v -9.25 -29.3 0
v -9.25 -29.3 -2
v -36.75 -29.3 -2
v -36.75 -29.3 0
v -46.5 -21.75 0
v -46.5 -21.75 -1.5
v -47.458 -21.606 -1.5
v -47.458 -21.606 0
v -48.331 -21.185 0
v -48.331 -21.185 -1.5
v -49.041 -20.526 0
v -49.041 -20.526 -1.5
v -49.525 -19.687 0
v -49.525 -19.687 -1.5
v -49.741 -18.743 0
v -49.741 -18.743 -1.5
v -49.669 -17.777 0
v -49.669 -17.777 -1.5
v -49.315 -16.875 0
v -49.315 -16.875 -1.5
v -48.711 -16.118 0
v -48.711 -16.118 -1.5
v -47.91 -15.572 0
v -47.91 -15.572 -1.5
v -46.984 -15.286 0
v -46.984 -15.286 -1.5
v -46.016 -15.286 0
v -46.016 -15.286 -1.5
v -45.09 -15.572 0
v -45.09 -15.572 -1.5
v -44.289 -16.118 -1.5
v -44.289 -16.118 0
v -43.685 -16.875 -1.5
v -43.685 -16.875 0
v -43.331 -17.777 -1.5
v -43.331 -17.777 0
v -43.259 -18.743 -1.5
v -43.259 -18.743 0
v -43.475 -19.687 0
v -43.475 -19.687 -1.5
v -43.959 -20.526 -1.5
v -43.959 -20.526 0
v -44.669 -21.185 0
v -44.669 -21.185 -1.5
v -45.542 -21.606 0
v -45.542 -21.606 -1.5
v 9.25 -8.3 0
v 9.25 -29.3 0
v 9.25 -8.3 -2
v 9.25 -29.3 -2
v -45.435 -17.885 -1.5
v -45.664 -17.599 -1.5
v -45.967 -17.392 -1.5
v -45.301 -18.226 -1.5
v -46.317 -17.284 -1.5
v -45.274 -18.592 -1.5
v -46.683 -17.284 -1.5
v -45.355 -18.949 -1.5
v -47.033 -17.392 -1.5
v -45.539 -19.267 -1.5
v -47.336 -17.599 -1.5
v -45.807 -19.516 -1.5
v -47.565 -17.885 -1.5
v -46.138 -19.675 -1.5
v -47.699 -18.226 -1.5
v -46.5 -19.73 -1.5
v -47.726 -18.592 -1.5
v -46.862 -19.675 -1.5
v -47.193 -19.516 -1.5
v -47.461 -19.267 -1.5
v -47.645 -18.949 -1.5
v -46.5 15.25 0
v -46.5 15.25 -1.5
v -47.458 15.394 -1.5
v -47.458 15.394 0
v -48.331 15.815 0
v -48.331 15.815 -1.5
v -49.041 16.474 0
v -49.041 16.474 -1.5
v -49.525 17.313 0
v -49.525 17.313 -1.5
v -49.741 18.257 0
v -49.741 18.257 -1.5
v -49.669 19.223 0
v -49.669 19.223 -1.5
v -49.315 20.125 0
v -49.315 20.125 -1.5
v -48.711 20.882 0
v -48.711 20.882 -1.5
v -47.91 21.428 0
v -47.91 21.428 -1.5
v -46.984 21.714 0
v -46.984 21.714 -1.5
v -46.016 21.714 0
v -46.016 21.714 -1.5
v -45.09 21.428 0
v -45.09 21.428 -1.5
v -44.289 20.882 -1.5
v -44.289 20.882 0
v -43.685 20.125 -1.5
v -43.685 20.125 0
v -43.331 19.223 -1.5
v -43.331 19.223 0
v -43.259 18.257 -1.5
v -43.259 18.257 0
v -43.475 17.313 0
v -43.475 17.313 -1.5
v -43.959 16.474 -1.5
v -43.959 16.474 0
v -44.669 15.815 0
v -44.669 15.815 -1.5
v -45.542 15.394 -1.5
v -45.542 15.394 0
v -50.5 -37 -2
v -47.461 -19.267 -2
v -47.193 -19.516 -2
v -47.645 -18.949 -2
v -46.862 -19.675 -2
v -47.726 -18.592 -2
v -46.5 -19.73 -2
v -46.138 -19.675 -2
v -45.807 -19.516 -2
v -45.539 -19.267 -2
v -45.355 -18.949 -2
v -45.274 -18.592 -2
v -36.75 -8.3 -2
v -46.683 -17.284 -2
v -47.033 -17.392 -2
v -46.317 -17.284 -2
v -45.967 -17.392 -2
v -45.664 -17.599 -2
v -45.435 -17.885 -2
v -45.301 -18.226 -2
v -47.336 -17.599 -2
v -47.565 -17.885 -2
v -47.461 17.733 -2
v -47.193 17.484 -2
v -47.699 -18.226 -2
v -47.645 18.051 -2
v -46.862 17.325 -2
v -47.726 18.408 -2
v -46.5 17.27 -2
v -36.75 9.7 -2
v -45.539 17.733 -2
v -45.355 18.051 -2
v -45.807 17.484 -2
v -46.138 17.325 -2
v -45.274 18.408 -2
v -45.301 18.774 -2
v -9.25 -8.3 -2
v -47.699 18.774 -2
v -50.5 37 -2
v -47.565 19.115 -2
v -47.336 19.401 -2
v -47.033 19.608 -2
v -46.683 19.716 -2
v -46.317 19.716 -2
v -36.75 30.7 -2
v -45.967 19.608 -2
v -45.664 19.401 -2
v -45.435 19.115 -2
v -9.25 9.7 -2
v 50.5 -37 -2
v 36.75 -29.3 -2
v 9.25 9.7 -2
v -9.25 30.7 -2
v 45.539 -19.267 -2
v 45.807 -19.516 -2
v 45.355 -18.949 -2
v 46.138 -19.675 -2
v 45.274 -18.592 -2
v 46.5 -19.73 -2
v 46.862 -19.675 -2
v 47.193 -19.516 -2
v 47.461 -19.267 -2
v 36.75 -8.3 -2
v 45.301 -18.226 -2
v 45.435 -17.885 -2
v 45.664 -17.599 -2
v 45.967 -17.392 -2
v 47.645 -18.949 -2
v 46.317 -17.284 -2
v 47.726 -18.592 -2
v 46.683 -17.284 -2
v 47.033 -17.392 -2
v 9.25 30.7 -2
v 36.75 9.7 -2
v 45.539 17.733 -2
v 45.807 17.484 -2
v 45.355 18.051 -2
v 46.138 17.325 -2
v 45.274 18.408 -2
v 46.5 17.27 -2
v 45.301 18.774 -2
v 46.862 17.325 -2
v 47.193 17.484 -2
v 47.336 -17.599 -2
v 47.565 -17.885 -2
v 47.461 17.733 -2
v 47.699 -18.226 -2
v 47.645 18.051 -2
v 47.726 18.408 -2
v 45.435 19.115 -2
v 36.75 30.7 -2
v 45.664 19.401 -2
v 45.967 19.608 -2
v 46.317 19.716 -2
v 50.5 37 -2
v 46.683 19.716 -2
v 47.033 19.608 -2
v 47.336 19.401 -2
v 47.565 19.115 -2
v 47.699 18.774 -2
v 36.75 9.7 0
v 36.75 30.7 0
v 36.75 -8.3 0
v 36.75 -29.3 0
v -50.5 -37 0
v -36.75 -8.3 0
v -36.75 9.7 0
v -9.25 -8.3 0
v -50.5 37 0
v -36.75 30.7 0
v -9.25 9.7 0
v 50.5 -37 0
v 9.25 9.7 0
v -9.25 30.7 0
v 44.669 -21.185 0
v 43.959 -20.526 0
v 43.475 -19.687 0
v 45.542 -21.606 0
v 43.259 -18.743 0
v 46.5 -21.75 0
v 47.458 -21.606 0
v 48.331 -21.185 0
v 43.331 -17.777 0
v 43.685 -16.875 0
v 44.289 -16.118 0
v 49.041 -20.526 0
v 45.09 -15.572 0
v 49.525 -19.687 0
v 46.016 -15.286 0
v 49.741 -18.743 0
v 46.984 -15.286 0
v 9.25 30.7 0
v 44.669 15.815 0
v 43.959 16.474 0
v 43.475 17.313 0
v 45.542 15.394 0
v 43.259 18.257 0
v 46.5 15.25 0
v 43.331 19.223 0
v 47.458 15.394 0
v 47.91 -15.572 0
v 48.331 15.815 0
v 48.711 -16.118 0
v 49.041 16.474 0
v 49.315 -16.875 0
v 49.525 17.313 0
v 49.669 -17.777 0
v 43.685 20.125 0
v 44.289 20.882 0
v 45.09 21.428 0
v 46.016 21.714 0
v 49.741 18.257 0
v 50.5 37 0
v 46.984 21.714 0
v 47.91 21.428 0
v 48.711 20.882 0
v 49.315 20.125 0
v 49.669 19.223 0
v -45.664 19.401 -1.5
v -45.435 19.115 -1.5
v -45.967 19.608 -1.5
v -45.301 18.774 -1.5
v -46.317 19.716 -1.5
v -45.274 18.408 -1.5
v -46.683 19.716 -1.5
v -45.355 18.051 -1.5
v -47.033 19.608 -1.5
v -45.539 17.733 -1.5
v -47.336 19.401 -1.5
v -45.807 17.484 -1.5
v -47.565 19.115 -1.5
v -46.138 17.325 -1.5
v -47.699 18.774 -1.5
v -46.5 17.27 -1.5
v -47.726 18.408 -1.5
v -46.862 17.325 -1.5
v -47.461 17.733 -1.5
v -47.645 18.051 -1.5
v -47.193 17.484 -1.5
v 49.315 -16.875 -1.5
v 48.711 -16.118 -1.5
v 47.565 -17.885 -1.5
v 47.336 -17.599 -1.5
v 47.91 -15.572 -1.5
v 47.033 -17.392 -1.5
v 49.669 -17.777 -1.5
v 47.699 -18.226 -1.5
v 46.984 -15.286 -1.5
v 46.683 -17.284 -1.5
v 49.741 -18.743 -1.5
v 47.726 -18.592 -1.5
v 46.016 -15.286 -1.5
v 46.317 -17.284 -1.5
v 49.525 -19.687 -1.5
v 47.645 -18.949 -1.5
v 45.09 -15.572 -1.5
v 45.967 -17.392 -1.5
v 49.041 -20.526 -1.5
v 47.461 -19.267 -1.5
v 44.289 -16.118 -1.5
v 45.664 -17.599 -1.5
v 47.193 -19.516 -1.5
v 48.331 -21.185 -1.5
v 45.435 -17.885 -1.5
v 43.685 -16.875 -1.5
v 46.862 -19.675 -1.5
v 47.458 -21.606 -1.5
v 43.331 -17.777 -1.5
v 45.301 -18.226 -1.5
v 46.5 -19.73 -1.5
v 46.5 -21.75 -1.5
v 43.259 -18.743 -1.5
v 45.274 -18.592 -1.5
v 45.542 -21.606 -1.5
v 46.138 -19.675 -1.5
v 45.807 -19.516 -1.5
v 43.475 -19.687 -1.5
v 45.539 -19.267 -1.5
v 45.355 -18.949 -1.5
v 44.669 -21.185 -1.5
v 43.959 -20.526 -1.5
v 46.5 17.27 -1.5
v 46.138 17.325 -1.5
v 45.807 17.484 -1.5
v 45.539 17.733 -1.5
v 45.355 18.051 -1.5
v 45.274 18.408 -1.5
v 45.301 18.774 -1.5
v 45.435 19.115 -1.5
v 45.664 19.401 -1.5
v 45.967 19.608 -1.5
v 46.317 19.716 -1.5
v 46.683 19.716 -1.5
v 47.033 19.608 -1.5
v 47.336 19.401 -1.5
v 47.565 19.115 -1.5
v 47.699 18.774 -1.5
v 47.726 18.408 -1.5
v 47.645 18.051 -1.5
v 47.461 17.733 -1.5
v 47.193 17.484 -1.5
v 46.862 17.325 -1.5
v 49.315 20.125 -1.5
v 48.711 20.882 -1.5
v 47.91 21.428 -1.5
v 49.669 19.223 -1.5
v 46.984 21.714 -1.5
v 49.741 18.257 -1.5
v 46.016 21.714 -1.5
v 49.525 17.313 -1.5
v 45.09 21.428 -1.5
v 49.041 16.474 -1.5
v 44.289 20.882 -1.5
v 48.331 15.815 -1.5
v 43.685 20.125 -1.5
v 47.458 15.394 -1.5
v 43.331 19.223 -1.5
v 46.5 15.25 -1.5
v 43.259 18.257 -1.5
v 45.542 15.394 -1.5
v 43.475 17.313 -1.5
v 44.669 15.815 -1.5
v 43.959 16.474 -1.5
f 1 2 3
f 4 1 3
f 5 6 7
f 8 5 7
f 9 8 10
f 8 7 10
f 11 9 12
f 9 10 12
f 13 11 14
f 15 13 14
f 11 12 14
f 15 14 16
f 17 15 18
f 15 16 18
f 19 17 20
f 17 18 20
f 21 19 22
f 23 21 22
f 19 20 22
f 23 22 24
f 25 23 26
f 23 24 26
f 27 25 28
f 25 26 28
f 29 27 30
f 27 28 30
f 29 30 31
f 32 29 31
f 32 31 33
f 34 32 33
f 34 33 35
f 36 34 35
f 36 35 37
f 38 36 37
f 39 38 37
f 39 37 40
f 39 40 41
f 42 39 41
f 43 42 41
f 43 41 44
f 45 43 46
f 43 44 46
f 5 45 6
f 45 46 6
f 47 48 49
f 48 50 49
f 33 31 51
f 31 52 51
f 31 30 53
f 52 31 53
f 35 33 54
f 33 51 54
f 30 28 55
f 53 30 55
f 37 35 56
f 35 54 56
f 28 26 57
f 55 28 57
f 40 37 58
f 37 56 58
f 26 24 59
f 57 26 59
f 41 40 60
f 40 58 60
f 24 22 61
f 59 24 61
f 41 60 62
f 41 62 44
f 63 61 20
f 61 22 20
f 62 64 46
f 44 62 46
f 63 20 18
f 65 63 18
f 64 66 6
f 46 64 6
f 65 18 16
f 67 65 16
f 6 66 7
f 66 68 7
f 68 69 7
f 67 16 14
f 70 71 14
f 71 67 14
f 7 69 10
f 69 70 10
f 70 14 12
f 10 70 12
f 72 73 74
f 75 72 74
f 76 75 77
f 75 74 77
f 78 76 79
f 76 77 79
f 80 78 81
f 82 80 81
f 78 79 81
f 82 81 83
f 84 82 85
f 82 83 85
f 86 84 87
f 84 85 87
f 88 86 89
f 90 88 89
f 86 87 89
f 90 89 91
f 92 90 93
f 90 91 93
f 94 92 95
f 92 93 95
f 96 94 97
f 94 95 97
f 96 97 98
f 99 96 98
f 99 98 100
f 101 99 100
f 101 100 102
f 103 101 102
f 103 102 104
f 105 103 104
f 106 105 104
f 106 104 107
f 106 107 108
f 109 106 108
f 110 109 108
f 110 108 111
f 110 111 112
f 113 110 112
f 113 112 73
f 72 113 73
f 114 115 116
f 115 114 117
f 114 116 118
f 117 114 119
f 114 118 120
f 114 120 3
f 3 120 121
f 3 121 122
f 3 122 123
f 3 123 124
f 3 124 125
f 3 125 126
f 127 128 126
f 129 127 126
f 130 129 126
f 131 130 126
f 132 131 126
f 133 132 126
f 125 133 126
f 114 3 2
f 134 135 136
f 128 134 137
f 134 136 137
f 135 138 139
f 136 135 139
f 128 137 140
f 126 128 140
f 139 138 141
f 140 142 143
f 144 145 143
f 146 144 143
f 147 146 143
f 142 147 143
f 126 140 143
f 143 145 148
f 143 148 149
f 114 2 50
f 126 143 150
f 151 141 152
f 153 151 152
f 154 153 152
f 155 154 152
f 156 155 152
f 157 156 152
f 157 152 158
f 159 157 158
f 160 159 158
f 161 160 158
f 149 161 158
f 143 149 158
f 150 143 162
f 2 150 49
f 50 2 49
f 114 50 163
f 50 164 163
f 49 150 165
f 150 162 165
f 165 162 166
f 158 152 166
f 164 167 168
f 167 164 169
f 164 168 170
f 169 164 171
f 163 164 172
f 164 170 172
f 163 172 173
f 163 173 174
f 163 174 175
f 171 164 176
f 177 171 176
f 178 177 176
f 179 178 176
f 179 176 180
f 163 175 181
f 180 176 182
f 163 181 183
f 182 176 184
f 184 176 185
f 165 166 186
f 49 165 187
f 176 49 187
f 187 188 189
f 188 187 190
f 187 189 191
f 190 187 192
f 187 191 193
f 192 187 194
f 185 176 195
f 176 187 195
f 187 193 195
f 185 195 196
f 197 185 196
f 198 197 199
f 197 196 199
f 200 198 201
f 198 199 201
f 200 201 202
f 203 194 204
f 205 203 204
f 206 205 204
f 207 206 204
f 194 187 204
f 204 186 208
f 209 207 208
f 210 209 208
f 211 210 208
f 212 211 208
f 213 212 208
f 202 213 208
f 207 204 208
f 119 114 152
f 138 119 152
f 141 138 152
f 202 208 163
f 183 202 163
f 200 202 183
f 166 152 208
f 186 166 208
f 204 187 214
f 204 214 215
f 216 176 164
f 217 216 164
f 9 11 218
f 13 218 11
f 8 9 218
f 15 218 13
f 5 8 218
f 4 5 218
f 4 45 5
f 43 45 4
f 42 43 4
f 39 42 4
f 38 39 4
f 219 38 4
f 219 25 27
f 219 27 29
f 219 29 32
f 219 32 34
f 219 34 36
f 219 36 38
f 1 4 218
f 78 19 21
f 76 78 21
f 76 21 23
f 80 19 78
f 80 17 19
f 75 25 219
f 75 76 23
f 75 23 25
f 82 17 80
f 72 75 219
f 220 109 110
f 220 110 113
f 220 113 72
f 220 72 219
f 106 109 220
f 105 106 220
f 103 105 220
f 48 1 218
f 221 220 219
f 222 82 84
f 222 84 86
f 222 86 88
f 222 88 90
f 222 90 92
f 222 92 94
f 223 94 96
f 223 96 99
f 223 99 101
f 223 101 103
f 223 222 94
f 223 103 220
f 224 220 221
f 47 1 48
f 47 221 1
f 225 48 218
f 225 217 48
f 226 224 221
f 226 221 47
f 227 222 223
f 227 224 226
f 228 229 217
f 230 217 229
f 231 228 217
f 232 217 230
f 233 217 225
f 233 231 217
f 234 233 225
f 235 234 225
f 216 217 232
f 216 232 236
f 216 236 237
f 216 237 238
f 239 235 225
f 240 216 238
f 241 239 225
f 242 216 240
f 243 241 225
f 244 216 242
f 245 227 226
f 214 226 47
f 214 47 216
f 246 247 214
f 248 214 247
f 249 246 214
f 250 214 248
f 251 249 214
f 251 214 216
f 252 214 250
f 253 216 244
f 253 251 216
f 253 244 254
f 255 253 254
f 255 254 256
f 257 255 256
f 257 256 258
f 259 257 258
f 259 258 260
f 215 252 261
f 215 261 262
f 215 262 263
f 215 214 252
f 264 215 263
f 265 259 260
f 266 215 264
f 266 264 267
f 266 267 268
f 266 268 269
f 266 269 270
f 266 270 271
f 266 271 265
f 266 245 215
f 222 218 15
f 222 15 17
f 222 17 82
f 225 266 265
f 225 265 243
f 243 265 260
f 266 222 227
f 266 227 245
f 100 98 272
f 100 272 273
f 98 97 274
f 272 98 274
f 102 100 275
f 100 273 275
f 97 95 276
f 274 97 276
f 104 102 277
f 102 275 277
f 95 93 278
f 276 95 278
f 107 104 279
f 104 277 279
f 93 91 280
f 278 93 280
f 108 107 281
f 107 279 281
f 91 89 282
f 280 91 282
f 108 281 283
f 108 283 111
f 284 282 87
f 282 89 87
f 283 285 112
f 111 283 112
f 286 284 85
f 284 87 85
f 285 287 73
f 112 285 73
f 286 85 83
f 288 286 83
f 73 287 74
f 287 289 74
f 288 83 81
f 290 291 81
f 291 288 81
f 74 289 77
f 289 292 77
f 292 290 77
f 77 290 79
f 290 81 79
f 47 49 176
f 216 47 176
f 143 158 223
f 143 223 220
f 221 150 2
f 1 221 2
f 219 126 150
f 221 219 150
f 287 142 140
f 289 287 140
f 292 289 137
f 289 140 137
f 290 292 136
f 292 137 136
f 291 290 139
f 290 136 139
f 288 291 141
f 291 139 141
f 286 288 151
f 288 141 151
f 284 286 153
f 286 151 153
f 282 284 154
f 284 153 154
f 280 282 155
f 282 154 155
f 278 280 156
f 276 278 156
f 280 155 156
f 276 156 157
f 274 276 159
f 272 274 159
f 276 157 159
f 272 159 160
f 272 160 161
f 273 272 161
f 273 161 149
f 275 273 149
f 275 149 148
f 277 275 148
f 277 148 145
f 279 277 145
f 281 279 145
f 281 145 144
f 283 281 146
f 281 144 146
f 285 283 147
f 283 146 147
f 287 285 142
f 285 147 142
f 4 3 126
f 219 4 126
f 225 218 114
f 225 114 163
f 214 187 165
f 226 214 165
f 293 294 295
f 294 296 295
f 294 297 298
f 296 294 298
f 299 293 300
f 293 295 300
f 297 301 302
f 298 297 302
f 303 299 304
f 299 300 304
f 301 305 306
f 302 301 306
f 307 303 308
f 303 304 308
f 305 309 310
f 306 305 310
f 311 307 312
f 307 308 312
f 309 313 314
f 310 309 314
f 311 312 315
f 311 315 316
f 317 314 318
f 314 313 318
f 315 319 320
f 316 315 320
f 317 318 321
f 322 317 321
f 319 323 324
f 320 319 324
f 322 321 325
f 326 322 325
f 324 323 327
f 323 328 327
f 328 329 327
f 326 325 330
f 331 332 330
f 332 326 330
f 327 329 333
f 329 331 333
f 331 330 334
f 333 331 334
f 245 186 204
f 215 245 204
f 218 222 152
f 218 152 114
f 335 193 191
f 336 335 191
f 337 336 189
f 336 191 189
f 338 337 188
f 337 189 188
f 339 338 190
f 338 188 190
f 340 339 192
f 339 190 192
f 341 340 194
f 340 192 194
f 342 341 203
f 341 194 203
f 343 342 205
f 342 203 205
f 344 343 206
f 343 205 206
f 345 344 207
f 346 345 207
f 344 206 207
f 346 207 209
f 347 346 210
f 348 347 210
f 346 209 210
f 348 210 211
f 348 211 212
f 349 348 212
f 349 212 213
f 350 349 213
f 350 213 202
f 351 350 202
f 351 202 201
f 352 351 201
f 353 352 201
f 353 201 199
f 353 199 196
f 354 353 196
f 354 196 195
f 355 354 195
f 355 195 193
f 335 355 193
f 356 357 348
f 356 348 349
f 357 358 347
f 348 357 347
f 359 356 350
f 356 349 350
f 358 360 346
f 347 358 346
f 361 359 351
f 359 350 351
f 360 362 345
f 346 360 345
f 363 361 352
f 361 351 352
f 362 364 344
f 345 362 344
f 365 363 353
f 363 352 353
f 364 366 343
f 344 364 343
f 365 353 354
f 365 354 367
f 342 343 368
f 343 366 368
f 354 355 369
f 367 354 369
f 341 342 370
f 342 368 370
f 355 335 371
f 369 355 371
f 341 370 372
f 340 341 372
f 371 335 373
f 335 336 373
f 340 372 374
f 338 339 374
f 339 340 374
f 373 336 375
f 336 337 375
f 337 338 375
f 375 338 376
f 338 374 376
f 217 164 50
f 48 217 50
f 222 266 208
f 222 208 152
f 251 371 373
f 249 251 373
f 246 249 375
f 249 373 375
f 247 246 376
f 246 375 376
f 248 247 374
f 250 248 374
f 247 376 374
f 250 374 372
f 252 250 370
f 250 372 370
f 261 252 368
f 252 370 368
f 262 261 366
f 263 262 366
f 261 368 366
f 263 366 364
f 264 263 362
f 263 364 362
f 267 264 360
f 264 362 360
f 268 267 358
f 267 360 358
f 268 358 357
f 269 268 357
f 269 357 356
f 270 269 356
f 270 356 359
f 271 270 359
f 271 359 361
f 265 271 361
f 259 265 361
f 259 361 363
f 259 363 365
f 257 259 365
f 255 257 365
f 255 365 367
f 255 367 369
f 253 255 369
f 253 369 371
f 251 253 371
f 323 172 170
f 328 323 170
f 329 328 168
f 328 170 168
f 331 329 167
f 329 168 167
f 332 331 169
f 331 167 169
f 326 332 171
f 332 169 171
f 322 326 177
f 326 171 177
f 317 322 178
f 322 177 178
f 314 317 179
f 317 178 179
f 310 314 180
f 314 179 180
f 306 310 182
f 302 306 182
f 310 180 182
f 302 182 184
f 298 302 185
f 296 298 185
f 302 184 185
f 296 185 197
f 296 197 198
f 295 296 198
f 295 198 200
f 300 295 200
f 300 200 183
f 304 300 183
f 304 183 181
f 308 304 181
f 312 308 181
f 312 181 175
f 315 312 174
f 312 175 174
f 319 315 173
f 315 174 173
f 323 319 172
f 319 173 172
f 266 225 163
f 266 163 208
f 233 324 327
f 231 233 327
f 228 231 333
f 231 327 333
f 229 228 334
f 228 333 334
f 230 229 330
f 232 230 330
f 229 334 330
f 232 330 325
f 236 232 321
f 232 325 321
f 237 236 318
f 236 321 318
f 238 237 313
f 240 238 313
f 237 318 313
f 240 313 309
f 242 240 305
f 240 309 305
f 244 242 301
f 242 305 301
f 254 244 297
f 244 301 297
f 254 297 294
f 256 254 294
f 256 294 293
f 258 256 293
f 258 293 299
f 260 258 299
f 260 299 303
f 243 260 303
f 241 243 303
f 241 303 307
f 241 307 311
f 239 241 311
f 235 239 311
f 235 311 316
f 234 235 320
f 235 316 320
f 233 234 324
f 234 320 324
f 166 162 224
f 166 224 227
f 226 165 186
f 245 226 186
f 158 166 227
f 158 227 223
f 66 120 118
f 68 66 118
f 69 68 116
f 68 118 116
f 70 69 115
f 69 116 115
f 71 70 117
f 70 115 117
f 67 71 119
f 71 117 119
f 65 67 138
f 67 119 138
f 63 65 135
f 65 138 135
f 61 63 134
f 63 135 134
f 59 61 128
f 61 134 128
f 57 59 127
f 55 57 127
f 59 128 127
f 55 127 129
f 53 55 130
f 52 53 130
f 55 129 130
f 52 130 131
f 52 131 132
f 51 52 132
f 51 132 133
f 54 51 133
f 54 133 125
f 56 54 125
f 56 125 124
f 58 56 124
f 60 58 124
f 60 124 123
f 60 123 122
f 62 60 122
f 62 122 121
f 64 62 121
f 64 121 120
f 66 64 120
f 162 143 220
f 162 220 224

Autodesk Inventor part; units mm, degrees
ref_plane "YZ Plane" through (0, 0, 0) normal (1, 0, 0) x (0, 1, 0)
ref_plane "XZ Plane" through (0, 0, 0) normal (0, 1, 0) x (-1, 0, 0)
ref_plane "XY Plane" through (0, 0, 0) normal (0, 0, 1) x (1, 0, 0)
sketch "Esboço1" plane through (0, 0, 0) normal (0, 0, 1) x (1, 0, 0)
  line L0 (-50.5, -37) -> (50.5, -37)
  line L1 (50.5, -37) -> (50.5, 37)
  line L2 (50.5, 37) -> (-50.5, 37)
  line L3 (-50.5, 37) -> (-50.5, -37)
  point P0 (0, 0)
  point P1 (0, 0)
  dimension "d17" = 101
  dimension "d18" = 74
  dimension "d19" = 50.5
  dimension "d20" = 37
  dimension "d21" = 50.5
  dimension "d22" = 37
extrude "Extrusão1" add sketch "Esboço1" against normal blind 2
sketch "Esboço2" plane through (0, 0, 0) normal (0, 0, 1) x (1, 0, 0)
  line L0 (-50.5, -37) -> (-50.5, 37)
  line L1 (-50.5, 37) -> (50.5, 37)
  line L2 (-46.5, 37) -> (-46.5, -37) construction
  line L3 (50.5, -37) -> (-50.5, -37)
  line L4 (46.5, 37) -> (46.5, -37) construction
  line L5 (-50.5, 18.5) -> (50.5, 18.5) construction
  line L6 (-50.5, -18.5) -> (50.5, -18.5) construction
  line L7 (50.5, 37) -> (50.5, -37)
  point P0 (0, 0)
  point P1 (0, 0)
  point P2 (-46.5, 18.5)
  point P3 (-46.5, -18.5)
  point P4 (46.5, -18.5)
  point P5 (46.5, 18.5)
  dimension "d28" = 4
  dimension "d29" = 97
  dimension "d30" = 101
  dimension "d31" = 55.5
  dimension "d32" = 18.5
  dimension "d33" = 74
  dimension "d34" = 50.5
  dimension "d35" = 37
  dimension "d36" = 0
hole "Furo1" at (-46.5, 18.5, 0) at (-46.5, -18.5, 0) at (46.5, -18.5, 0) at (46.5, 18.5, 0) direction (0, 0, -1) diameter 2.459 end through all counterbore diameter 6.5 counterbore depth 1.5
sketch "Esboço3" plane through (0, 0, -2) normal (0, 0, -1) x (-1, 0, 0)
  line L0 (-36.25, 14.25) -> (-36.25, 21.4827) projected
  line L1 (-36.0982, 21.8416) -> (-33.0537, 24.7952) projected
  line L2 (-32.75, 25.5129) -> (-32.75, 29.7) projected
  line L3 (-32.25, 30.2) -> (-13.75, 30.2) projected
  line L4 (-10.25, 14.25) -> (-10.25, 21.4827) projected
  line L5 (-12.9463, 24.7952) -> (-9.9018, 21.8416) projected
  line L6 (-13.25, 29.7) -> (-13.25, 25.5129) projected
  line L7 (-27.134, 10.7) -> (-18.866, 10.7) projected
  line L8 (-13.8, 11.25) -> (-32.2, 11.25) projected
  line L9 (-13.8, 10.2) -> (-32.2, 10.2) projected
  arc A0 (-36.25, 14.25) -> (-32.2, 10.2) centre (-32.2, 14.25) ccw projected
  line L10 (-36.25, 14.25) -> (-36.25, 21.4827) projected
  arc A1 (-13.8, 10.2) -> (-9.75, 14.25) centre (-13.8, 14.25) ccw projected
  line L11 (-9.75, 21.4827) -> (-9.75, 14.25) projected
  line L12 (-12.9463, 24.7952) -> (-9.9018, 21.8416) projected
  line L13 (-32.25, 30.2) -> (-13.75, 30.2) projected
  line L14 (-13.25, 29.7) -> (-13.25, 25.5129) projected
  arc A2 (-13.25, 29.7) -> (-13.75, 30.2) centre (-13.75, 29.7) ccw projected
  arc A3 (-13.25, 25.5129) -> (-12.9463, 24.7952) centre (-12.25, 25.5129) ccw projected
  arc A4 (-9.75, 21.4827) -> (-9.9018, 21.8416) centre (-10.25, 21.4827) ccw projected
  arc A5 (-32.25, 30.2) -> (-32.75, 29.7) centre (-32.25, 29.7) ccw projected
  arc A6 (-36.0982, 21.8416) -> (-36.25, 21.4827) centre (-35.75, 21.4827) ccw projected
  arc A7 (-33.0537, 24.7952) -> (-32.75, 25.5129) centre (-33.75, 25.5129) ccw projected
  line L15 (-36.75, 9.7) -> (-9.25, 9.7)
  line L16 (-9.25, 9.7) -> (-9.25, 30.7)
  line L17 (-9.25, 30.7) -> (-36.75, 30.7)
  line L18 (-36.75, 9.7) -> (-36.75, 30.7)
  line L19 (9.75, 14.25) -> (9.75, 21.4827) projected
  arc A8 (9.75, 14.25) -> (13.8, 10.2) centre (13.8, 14.25) ccw projected
  line L20 (32.2, 10.2) -> (13.8, 10.2) projected
  arc A9 (32.903, 10.7703) -> (35.75, 14.25) centre (32.2, 14.25) ccw projected
  arc A10 (32.2, 10.2) -> (36.25, 14.25) centre (32.2, 14.25) ccw projected
  line L21 (36.25, 21.4827) -> (36.25, 14.25) projected
  line L22 (13.75, 30.2) -> (32.25, 30.2) projected
  line L23 (-36.25, -24.75) -> (-36.25, -17.5173) projected
  arc A11 (-36.25, -24.75) -> (-32.2, -28.8) centre (-32.2, -24.75) ccw projected
  line L24 (-13.8, -28.8) -> (-32.2, -28.8) projected
  arc A12 (-13.8, -28.8) -> (-9.75, -24.75) centre (-13.8, -24.75) ccw projected
  line L25 (-9.75, -17.5173) -> (-9.75, -24.75) projected
  line L26 (-32.25, -8.8) -> (-13.75, -8.8) projected
  line L27 (13.75, -8.8) -> (32.25, -8.8) projected
  line L28 (9.75, -24.75) -> (9.75, -17.5173) projected
  arc A13 (9.75, -24.75) -> (13.8, -28.8) centre (13.8, -24.75) ccw projected
  line L29 (32.2, -28.8) -> (13.8, -28.8) projected
  arc A14 (32.2, -28.8) -> (36.25, -24.75) centre (32.2, -24.75) ccw projected
  line L30 (36.25, -17.5173) -> (36.25, -24.75) projected
  line L31 (9.25, 30.7) -> (36.75, 30.7)
  line L32 (36.75, 30.7) -> (36.75, 9.7)
  line L33 (36.75, 9.7) -> (9.25, 9.7)
  line L34 (9.25, 9.7) -> (9.25, 30.7)
  line L35 (-36.75, -8.3) -> (-36.75, -29.3)
  line L36 (-36.75, -29.3) -> (-9.25, -29.3)
  line L37 (-9.25, -29.3) -> (-9.25, -8.3)
  line L38 (-9.25, -8.3) -> (-36.75, -8.3)
  line L39 (9.25, -8.3) -> (9.25, -29.3)
  line L40 (9.25, -29.3) -> (36.75, -29.3)
  line L41 (36.75, -29.3) -> (36.75, -8.3)
  line L42 (36.75, -8.3) -> (9.25, -8.3)
  point P0 (0, 0)
  dimension "d51" = 1
  dimension "d52" = 27
  dimension "d53" = 19.45
  dimension "d54" = 1.55
  dimension "d67" = 0.5
  dimension "d68" = 0.5
  dimension "d69" = 27
  dimension "d70" = 27
  dimension "d71" = 45.5
  dimension "d72" = 73
  dimension "d73" = 20.5
  dimension "d74" = 0.5
  dimension "d75" = 18.5
  dimension "d76" = 39.5
  dimension "d77" = 18.5
  dimension "d78" = 0.5
extrude "Extrusão3" cut sketch "Esboço3" against normal blind 10 contours L0 A6 L1 A7 L2 A5 L3 A2 L6 A3 L5 A4 L11 A1 L9 A0 | L18 L17 L16 L15 | L31 L32 L33 L34 | L38 L37 L36 L35 | L42 L41 L40 L39
properties part number "Ra-Manager_Painel-Placas_Tras_Plugs"
